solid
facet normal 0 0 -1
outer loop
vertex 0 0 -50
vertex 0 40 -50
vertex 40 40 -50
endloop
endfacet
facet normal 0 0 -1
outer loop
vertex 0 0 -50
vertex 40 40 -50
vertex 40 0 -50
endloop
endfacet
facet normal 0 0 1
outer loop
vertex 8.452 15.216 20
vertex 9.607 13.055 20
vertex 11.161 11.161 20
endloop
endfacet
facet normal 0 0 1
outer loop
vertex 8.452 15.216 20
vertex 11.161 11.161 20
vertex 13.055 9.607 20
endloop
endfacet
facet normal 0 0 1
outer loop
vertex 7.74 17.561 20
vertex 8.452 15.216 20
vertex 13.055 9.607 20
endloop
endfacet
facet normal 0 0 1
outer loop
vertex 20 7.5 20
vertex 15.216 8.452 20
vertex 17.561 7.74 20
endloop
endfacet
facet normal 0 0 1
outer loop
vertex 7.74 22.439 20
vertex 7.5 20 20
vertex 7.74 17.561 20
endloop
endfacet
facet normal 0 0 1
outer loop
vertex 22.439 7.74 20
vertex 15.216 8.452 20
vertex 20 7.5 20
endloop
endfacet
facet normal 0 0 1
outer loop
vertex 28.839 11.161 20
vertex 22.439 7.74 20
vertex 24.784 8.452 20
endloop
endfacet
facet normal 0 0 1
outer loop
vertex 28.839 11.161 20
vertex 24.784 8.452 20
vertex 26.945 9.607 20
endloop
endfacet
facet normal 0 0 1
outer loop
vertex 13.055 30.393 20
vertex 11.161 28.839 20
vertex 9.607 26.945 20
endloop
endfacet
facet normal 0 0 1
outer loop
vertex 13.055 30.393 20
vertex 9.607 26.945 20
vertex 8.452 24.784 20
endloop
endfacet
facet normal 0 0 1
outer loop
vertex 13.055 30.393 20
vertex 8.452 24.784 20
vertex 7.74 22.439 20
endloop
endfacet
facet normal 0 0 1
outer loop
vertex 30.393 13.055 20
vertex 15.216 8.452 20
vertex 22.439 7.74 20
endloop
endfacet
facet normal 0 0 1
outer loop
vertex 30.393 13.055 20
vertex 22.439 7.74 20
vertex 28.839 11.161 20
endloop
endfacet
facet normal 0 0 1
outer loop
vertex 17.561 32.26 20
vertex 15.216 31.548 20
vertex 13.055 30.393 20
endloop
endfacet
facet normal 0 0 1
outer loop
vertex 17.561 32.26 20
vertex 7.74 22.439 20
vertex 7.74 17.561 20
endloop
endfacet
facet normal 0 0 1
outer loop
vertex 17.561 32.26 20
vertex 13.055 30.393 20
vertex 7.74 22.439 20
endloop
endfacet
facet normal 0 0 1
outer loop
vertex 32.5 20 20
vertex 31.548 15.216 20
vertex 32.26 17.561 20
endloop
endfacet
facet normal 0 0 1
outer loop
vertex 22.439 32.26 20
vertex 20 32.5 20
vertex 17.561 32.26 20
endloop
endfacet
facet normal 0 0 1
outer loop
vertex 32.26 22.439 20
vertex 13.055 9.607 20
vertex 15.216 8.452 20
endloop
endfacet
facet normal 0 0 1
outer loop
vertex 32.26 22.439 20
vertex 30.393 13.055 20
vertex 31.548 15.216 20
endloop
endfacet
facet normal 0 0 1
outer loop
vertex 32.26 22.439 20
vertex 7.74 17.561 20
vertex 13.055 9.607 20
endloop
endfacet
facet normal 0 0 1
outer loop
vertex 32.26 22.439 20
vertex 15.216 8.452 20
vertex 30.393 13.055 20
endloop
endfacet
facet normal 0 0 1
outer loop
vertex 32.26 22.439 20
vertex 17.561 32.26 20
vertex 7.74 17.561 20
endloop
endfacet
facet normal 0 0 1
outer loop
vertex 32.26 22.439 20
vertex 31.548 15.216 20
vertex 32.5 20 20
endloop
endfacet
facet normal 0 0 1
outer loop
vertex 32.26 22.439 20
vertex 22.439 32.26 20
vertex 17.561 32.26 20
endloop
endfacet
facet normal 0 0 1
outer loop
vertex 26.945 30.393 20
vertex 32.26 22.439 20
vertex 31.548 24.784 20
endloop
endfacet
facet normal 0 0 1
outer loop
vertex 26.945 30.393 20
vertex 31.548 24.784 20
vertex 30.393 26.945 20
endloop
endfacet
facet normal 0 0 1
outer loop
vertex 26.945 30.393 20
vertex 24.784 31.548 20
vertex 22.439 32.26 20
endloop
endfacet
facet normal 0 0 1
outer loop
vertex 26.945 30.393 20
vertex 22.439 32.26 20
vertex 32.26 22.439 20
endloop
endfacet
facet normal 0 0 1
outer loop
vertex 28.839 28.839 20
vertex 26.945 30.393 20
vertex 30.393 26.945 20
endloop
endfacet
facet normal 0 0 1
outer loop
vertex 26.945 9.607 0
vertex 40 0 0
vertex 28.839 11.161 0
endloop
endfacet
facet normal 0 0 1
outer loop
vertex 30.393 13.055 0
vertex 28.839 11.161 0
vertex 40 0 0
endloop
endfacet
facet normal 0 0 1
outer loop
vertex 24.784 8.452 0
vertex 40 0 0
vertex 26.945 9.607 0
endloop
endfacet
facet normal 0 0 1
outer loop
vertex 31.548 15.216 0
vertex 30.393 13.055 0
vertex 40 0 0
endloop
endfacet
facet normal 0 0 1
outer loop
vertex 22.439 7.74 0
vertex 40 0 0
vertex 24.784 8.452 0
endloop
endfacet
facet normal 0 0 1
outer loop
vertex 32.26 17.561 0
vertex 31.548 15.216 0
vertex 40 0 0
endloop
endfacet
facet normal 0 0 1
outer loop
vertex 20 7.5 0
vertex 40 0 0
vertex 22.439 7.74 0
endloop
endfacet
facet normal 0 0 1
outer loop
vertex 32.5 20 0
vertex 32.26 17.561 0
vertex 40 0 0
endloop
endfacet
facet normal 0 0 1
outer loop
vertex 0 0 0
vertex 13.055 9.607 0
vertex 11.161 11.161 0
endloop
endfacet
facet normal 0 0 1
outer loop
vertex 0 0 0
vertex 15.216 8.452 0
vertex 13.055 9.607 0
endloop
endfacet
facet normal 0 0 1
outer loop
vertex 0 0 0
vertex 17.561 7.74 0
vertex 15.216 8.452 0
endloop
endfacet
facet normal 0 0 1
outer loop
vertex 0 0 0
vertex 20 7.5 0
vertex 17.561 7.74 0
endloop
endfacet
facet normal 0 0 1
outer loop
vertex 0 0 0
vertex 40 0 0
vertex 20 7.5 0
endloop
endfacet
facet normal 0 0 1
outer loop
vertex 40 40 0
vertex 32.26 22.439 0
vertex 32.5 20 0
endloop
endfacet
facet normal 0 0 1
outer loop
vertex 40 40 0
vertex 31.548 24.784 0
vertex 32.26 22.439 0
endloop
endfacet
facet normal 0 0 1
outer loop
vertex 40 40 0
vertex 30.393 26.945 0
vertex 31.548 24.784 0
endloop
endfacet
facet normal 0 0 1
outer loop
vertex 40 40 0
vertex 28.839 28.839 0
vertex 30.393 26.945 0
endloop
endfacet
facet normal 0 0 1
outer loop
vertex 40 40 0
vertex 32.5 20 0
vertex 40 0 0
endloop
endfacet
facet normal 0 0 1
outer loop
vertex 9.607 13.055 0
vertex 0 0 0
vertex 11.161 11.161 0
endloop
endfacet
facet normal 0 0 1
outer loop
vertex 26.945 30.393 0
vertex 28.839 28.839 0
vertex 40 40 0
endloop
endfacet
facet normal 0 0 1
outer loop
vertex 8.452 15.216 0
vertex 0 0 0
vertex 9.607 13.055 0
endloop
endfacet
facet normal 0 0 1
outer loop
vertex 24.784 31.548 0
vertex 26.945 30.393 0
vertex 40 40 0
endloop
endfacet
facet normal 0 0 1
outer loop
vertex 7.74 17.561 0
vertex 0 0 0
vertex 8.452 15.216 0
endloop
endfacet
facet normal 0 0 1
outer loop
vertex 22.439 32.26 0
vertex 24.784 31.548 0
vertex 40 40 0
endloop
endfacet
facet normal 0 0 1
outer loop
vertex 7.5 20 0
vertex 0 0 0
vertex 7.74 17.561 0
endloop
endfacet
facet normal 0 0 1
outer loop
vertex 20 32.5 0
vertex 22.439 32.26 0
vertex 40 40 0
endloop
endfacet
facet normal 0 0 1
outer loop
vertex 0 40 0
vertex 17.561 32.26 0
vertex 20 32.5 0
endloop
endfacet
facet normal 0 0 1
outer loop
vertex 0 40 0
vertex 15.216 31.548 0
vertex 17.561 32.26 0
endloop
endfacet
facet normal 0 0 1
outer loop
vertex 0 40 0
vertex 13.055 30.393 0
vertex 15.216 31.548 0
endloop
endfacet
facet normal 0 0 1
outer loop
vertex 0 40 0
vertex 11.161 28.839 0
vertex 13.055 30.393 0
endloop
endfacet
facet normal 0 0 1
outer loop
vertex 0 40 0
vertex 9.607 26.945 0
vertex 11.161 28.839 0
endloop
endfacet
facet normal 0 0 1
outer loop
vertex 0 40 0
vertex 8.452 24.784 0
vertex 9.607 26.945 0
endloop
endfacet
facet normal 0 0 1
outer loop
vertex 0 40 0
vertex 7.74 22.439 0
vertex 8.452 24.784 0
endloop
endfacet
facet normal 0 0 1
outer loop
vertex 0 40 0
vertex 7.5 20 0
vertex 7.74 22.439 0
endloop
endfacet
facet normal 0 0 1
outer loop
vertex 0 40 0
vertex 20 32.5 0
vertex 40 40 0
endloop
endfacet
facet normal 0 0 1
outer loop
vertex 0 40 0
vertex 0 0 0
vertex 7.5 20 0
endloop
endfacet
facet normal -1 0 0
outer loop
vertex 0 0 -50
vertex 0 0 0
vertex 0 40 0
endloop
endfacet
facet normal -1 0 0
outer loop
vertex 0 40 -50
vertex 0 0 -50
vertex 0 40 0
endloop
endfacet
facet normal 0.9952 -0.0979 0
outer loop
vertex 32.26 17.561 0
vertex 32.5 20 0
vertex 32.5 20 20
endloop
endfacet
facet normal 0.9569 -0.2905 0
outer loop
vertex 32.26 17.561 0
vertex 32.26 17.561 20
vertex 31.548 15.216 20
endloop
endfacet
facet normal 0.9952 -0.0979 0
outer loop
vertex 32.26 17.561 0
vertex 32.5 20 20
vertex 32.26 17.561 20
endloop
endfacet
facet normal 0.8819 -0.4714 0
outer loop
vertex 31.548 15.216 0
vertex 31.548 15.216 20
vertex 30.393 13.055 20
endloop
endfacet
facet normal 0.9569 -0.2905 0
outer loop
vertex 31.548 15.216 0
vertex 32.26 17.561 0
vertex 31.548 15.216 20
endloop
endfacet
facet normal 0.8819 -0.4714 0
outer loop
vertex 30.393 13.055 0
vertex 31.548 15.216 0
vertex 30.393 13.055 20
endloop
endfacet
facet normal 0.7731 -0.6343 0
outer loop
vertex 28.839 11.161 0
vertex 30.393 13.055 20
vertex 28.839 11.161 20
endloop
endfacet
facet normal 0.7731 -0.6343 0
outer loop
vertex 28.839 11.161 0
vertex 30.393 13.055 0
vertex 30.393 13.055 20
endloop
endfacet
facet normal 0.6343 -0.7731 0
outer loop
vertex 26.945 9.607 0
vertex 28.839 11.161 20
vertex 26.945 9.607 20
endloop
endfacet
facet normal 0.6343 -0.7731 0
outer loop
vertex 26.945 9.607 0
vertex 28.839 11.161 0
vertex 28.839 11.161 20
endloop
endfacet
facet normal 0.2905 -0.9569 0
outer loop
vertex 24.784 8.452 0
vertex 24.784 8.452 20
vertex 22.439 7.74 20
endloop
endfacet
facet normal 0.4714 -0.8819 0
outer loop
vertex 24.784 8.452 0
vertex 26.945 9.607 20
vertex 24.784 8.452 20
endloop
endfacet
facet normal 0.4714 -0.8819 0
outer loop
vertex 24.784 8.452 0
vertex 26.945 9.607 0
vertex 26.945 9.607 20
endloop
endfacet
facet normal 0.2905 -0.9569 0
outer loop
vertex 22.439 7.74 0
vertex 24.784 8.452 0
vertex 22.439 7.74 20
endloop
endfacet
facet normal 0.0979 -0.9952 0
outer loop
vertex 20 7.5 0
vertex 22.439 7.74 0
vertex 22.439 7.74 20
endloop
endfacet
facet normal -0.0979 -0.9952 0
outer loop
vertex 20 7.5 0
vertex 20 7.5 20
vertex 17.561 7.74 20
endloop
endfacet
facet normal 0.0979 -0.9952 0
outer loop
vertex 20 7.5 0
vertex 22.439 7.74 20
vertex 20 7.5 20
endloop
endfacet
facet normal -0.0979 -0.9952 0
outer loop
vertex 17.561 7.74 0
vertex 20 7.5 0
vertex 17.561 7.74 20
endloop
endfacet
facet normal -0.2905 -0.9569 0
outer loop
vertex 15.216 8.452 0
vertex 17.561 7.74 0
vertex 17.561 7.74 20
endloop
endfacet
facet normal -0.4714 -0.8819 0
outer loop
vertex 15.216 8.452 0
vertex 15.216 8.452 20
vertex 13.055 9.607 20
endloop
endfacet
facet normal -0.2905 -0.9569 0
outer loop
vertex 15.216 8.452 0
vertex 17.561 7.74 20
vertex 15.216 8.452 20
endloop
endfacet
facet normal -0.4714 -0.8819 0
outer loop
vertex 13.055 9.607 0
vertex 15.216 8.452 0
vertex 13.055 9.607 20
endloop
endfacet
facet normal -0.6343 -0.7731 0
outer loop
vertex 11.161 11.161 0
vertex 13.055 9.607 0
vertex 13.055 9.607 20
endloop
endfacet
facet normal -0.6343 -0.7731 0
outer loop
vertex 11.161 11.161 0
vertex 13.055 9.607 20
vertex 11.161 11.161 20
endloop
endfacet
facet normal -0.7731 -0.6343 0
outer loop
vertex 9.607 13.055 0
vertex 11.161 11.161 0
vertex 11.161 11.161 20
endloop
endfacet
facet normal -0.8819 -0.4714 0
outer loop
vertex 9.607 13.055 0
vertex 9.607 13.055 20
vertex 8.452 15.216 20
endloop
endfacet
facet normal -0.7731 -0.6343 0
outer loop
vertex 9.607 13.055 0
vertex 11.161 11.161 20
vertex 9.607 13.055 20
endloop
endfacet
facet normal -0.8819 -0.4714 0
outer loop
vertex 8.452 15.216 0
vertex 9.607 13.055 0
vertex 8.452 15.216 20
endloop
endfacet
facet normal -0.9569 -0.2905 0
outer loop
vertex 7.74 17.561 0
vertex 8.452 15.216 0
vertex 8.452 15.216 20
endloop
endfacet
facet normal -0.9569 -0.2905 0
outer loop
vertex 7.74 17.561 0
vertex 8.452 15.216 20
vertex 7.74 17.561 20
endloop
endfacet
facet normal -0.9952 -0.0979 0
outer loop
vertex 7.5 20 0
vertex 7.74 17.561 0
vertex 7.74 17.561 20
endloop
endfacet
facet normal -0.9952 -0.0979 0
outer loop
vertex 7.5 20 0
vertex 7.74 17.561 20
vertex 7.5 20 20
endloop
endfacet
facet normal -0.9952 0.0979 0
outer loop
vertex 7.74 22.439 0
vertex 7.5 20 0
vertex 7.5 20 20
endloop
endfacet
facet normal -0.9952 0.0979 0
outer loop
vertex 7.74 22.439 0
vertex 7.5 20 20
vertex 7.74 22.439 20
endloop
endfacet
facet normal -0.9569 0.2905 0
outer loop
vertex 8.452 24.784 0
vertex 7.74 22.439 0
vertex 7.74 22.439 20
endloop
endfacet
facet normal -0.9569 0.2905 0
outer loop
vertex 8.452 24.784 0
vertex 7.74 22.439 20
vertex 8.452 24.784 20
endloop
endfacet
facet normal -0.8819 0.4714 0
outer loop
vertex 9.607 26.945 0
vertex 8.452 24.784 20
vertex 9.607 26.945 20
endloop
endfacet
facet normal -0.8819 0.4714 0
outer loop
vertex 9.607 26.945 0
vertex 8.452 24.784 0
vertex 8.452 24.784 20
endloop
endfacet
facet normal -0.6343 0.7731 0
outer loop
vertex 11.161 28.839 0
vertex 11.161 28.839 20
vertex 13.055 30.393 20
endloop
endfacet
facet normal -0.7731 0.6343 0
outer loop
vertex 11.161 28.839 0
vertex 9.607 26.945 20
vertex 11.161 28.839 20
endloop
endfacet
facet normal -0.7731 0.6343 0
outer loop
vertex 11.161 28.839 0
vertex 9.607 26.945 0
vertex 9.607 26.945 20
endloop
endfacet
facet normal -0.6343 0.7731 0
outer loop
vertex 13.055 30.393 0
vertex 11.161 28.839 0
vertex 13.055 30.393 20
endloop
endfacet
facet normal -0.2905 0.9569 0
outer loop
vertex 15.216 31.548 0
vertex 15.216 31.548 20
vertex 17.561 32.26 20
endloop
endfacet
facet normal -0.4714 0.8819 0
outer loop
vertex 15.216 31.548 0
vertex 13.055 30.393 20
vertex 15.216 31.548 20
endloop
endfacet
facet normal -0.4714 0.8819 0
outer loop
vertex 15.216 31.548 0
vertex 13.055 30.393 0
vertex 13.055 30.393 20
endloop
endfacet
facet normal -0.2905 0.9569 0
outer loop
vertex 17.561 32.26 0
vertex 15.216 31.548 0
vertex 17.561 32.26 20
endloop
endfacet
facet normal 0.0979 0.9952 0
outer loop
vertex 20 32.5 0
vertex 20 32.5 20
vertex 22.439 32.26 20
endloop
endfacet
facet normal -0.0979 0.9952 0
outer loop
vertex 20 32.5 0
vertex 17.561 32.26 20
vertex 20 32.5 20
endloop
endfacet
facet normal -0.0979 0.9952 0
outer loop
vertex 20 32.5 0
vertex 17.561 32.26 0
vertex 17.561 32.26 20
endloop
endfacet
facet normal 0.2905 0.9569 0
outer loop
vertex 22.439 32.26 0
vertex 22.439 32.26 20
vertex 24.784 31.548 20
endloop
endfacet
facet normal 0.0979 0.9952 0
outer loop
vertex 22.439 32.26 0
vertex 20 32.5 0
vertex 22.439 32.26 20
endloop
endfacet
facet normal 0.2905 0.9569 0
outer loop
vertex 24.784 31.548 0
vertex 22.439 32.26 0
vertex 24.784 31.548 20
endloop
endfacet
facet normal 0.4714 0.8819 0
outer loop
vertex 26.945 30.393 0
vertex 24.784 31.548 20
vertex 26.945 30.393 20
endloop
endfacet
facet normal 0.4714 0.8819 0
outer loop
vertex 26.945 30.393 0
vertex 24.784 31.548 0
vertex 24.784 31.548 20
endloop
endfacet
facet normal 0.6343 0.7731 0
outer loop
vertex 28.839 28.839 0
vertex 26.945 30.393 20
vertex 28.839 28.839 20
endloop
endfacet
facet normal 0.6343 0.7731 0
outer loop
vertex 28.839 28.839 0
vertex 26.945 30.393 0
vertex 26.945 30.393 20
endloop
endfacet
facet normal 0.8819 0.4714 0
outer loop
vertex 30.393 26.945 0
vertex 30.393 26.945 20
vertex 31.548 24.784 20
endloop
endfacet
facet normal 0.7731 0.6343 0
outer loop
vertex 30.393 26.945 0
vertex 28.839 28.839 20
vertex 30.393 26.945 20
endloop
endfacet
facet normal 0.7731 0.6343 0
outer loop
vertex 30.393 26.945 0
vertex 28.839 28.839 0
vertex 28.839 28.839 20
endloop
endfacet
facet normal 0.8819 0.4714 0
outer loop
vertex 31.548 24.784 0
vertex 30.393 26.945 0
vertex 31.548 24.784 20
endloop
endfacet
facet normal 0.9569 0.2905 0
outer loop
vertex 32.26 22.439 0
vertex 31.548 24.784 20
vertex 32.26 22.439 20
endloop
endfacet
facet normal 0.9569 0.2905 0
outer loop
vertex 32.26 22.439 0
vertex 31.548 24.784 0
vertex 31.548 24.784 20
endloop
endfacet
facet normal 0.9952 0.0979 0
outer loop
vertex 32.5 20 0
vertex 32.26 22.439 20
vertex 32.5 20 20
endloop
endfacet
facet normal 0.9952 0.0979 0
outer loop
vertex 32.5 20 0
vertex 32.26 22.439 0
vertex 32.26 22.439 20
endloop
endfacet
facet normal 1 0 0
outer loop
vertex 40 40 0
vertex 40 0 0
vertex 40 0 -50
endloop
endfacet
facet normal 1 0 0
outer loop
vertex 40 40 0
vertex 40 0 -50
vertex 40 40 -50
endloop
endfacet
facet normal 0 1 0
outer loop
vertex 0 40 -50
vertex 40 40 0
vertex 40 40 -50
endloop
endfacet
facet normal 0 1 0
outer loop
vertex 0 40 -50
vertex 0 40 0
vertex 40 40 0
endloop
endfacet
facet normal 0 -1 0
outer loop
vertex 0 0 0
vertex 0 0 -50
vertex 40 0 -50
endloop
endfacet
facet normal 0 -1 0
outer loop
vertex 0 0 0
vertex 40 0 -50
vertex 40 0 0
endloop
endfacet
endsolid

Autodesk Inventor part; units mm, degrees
ref_plane "YZ Plane" through (0, 0, 0) normal (1, 0, 0) x (0, 1, 0)
ref_plane "XZ Plane" through (0, 0, 0) normal (0, 1, 0) x (-1, 0, 0)
ref_plane "XY Plane" through (0, 0, 0) normal (0, 0, 1) x (1, 0, 0)
sketch "Skizze1" plane through (0, 0, 0) normal (1, 0, 0) x (0, 1, 0)
  line L0 (0, 0) -> (40, 0)
  line L1 (40, 0) -> (40, -50)
  line L2 (40, -50) -> (0, -50)
  line L3 (0, -50) -> (0, 0)
  dimension "d0" = 40
  dimension "d1" = 50
extrude "Extrusion1" add sketch "Skizze1" along normal blind 40
sketch "Skizze2" plane through (0, 0, 0) normal (0, 0, 1) x (1, 0, 0)
  line L0 (0, 40) -> (40, 40) construction
  line L1 (0, 0) -> (40, 40) construction
  line L2 (0, 40) -> (40, 0) construction
  line L3 (40, 40) -> (40, 0) construction
  circle A0 centre (20, 20) radius 12.5
  dimension "d4" = 25
extrude "Extrusion2" add sketch "Skizze2" along normal blind 20
sketch "Skizze3" plane through (40, 0, 0) normal (1, 0, 0) x (0, 0, -1)
  line L0 (3.2137, 16.0634) -> (29.2155, 16.0634) construction
  line L1 (29.2155, 16.0634) -> (29.2155, 5.0626) construction
  line L2 (29.2155, 5.0626) -> (3.2137, 5.0626) construction
  line L3 (3.2137, 5.0626) -> (3.2137, 16.0634) construction
  point P0 (0, 0)
properties part number "kamera_dummy"
